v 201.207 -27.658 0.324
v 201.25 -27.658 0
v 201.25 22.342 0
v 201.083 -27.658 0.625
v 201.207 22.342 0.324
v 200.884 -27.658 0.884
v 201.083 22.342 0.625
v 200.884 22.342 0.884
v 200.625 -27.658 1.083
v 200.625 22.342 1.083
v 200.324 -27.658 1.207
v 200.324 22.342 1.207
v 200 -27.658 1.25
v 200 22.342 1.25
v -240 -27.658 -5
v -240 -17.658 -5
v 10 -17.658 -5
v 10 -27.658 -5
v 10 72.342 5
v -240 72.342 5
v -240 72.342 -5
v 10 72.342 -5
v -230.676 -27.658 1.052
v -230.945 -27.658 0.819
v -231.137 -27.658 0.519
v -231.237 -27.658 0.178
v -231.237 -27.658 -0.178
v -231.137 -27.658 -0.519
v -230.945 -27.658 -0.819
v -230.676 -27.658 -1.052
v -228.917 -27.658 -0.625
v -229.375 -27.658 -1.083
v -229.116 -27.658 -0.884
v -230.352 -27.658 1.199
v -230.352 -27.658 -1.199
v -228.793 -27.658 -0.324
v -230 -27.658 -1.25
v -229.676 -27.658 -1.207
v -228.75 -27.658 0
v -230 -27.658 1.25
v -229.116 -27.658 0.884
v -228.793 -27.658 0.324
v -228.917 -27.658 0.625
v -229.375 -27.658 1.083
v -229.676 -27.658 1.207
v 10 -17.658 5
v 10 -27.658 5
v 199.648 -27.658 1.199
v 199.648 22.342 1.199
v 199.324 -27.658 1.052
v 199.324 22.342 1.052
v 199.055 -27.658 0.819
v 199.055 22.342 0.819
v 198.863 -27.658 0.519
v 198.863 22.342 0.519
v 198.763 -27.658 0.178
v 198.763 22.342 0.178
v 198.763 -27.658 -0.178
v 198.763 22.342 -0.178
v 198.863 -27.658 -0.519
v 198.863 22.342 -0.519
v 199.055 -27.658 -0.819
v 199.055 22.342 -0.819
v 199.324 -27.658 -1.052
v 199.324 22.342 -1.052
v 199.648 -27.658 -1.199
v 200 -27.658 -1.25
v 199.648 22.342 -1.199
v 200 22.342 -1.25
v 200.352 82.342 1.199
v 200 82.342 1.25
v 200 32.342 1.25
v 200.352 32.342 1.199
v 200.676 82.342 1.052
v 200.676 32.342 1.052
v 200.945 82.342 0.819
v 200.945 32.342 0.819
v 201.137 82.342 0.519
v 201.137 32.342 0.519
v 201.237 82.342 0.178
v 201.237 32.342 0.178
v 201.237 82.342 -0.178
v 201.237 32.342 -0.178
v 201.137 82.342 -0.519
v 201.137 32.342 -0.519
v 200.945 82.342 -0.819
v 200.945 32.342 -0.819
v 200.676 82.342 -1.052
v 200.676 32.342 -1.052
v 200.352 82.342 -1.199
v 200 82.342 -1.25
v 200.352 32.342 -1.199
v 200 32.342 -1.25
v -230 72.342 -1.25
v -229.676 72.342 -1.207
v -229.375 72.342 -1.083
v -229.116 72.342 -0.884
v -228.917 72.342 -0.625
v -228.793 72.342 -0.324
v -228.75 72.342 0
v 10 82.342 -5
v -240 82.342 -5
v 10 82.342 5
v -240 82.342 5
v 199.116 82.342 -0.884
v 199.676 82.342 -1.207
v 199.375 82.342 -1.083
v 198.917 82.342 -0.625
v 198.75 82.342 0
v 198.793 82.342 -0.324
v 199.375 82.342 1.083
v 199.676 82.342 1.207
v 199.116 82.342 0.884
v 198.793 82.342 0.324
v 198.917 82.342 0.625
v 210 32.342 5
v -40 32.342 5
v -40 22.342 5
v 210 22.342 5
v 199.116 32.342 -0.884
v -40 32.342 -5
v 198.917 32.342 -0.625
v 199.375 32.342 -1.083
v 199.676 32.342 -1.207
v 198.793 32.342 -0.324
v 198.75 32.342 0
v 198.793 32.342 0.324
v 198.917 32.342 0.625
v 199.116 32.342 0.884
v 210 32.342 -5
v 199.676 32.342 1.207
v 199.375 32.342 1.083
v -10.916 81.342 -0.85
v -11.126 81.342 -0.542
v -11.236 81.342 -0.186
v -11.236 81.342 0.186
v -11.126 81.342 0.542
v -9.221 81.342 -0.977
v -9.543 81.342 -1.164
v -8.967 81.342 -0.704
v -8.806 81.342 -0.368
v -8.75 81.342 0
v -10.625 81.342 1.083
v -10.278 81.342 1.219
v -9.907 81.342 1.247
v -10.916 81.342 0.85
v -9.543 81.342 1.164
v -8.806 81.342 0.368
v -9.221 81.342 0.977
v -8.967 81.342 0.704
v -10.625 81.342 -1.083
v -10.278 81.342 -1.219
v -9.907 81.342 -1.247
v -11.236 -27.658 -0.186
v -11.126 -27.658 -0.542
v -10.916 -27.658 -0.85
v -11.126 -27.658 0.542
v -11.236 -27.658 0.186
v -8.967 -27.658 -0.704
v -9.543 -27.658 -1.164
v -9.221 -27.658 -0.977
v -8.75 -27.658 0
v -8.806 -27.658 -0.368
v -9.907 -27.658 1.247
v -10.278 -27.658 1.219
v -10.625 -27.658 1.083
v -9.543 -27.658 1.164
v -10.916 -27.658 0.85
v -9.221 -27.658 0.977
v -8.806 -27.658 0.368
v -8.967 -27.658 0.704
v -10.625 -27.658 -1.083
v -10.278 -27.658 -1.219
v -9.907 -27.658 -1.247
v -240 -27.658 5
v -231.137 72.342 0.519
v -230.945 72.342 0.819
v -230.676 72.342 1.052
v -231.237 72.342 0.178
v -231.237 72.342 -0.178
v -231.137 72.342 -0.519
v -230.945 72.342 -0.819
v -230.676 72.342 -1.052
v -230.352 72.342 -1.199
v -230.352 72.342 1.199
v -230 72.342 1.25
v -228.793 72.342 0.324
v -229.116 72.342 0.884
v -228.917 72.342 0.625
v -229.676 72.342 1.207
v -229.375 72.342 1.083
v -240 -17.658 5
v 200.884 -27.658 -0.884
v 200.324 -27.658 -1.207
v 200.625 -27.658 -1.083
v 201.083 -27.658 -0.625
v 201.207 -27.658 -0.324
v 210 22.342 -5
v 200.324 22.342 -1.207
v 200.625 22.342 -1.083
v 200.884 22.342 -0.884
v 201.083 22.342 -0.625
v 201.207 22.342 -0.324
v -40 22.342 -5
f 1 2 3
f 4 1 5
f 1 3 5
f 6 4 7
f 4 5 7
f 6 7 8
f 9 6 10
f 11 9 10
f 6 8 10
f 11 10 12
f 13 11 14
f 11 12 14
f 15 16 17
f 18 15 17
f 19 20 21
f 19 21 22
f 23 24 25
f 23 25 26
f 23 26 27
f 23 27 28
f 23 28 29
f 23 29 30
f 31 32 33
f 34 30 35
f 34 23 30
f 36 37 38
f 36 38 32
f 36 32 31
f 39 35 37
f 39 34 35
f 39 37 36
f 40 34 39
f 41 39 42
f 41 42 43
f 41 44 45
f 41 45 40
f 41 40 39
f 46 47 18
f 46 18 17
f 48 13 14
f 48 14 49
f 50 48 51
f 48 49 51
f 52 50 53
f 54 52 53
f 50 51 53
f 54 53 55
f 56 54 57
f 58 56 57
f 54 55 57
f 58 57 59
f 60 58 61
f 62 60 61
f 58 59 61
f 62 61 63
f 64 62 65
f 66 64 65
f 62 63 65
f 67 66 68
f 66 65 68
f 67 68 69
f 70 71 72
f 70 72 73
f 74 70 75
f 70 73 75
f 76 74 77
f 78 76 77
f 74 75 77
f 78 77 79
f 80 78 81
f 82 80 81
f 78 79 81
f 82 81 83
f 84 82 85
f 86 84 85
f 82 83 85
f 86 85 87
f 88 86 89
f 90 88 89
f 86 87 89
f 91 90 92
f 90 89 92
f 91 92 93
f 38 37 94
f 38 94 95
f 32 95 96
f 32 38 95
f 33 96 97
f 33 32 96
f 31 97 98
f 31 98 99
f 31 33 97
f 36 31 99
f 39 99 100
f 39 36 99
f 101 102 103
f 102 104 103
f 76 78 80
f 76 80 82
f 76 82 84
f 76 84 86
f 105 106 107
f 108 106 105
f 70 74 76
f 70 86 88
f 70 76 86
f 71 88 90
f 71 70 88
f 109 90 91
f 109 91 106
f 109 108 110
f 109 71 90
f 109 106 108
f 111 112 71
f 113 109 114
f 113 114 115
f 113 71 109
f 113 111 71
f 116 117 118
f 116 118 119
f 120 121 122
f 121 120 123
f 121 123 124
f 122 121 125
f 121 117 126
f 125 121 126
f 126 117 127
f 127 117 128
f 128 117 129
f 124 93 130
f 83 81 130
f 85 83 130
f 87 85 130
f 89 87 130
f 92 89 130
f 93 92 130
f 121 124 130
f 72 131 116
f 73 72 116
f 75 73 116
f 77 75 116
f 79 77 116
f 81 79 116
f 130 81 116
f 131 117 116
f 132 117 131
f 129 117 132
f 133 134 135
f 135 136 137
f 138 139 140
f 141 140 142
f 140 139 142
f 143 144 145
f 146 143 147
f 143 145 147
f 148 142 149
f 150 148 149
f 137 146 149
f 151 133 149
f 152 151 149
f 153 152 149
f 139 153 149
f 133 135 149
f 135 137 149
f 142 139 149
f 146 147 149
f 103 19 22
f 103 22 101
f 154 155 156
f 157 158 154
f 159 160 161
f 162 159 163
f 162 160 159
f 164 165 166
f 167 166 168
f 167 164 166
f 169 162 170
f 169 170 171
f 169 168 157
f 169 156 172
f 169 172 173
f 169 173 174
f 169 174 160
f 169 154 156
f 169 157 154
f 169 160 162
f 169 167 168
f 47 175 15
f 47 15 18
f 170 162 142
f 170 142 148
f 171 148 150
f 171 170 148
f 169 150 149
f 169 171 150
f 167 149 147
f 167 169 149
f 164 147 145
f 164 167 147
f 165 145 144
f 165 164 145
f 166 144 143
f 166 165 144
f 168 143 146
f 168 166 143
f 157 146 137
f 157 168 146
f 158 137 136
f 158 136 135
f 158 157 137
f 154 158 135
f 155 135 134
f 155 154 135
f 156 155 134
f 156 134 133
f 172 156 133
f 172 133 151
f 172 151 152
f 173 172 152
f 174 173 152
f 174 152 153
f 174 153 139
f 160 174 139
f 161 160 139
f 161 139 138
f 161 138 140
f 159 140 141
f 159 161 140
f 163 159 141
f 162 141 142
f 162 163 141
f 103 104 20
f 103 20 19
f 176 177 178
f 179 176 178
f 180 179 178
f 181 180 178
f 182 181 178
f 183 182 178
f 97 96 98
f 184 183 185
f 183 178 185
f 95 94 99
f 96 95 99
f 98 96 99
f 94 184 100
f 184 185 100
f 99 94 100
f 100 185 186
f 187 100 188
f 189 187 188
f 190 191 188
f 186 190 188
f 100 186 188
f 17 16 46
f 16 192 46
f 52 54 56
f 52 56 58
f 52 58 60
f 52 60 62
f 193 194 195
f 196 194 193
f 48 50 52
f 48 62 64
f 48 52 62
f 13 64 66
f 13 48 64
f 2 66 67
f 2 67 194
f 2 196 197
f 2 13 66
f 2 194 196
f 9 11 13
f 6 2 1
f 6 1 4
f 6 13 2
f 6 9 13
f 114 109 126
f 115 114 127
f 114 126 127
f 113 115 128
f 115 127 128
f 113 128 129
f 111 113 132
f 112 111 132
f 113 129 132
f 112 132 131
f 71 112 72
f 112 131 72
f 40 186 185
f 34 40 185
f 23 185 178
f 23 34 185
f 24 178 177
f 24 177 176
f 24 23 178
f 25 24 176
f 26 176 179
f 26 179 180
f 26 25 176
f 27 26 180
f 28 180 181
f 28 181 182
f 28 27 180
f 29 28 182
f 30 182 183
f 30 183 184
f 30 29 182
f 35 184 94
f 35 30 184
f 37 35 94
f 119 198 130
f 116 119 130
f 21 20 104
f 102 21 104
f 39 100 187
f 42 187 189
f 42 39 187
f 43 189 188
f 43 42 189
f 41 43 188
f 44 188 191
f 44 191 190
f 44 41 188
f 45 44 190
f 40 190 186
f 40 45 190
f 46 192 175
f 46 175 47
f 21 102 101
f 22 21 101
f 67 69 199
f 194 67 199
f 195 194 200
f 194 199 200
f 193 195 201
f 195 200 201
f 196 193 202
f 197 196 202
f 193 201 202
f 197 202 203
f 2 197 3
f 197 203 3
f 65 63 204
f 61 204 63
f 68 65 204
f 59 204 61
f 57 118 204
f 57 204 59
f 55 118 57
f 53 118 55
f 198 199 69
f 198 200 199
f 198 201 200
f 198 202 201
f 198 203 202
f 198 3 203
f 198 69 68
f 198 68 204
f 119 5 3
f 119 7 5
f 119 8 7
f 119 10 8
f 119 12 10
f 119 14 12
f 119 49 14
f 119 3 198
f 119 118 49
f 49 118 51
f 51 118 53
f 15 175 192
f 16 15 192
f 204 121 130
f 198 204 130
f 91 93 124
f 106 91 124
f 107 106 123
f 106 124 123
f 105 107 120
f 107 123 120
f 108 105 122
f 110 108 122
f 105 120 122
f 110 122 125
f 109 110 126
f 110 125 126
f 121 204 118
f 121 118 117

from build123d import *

# Parameters (mm, degrees)
F0_W     = 250
F0_H     = 10
F1_DEPTH = 5
F2_R     = 1.25
F3_DEPTH = 109
F5_DEPTH = 100
F7_DEPTH = 50
F9_DEPTH = 50


with BuildPart() as f1:
    # F0 (on Top) → F1 (new body, symmetric)
    with BuildSketch(Plane.XY):
        with Locations((-115, 77.3421949893)):
            Rectangle(F0_W, F0_H)
    extrude(amount=F1_DEPTH, both=True)


with BuildPart() as f1b:
    # F0 (on Top) → F1, piece 2 (new body, symmetric)
    with BuildSketch(Plane.XY):
        with Locations((85, 27.3421949893)):
            Rectangle(F0_W, F0_H)
    extrude(amount=F1_DEPTH, both=True)

    # F6 (on face) → F7 (join)
    with BuildSketch(Plane(origin=(0, 32.3421949893, 0), x_dir=(-1, 0, 0), z_dir=(0, 1, 0))):
        with BuildLine():
            ThreePointArc((-198.75, 0), (-199.1161165235, 0.8838834765), (-200, 1.25))
            Line((-200, 1.25), (-200, -1.25))
            ThreePointArc((-200, -1.25), (-199.1161165235, -0.8838834765), (-198.75, 0))
        make_face()
        with BuildLine():
            Line((-200, -1.25), (-200, 1.25))
            ThreePointArc((-200, 1.25), (-201.25, 0), (-200, -1.25))
        make_face()
    extrude(amount=F7_DEPTH)

    # F8 (on face) → F9 (join)
    with BuildSketch(Plane.XZ.offset(-22.3421949893)):
        with BuildLine():
            ThreePointArc((201.25, 0), (200.8838834765, 0.8838834765), (200, 1.25))
            Line((200, 1.25), (200, -1.25))
            ThreePointArc((200, -1.25), (200.8838834765, -0.8838834765), (201.25, 0))
        make_face()
        with BuildLine():
            Line((200, -1.25), (200, 1.25))
            ThreePointArc((200, 1.25), (198.75, 0), (200, -1.25))
        make_face()
    extrude(amount=F9_DEPTH)


with BuildPart() as f1c:
    # F0 (on Top) → F1, piece 3 (new body, symmetric)
    with BuildSketch(Plane.XY):
        with Locations((-115, -22.6578050107)):
            Rectangle(F0_W, F0_H)
    extrude(amount=F1_DEPTH, both=True)


with BuildPart() as f3:
    # F2 (on face) → F3 (new body)
    with BuildSketch(Plane.XZ.offset(27.6578050107)):
        with Locations((-10, 0)):
            Circle(F2_R)
    extrude(amount=-F3_DEPTH)


with BuildPart() as f5:
    # F4 (on face) → F5 (new body)
    with BuildSketch(Plane.XZ.offset(27.6578050107)):
        with BuildLine():
            Line((-230, -1.25), (-230, 1.25))
            ThreePointArc((-230, 1.25), (-231.25, 0), (-230, -1.25))
        make_face()
        with BuildLine():
            ThreePointArc((-228.75, 0), (-229.1161165235, 0.8838834765), (-230, 1.25))
            Line((-230, 1.25), (-230, -1.25))
            ThreePointArc((-230, -1.25), (-229.1161165235, -0.8838834765), (-228.75, 0))
        make_face()
    extrude(amount=-F5_DEPTH)


solid = Compound([f1.part, f1b.part, f1c.part, f3.part, f5.part])
